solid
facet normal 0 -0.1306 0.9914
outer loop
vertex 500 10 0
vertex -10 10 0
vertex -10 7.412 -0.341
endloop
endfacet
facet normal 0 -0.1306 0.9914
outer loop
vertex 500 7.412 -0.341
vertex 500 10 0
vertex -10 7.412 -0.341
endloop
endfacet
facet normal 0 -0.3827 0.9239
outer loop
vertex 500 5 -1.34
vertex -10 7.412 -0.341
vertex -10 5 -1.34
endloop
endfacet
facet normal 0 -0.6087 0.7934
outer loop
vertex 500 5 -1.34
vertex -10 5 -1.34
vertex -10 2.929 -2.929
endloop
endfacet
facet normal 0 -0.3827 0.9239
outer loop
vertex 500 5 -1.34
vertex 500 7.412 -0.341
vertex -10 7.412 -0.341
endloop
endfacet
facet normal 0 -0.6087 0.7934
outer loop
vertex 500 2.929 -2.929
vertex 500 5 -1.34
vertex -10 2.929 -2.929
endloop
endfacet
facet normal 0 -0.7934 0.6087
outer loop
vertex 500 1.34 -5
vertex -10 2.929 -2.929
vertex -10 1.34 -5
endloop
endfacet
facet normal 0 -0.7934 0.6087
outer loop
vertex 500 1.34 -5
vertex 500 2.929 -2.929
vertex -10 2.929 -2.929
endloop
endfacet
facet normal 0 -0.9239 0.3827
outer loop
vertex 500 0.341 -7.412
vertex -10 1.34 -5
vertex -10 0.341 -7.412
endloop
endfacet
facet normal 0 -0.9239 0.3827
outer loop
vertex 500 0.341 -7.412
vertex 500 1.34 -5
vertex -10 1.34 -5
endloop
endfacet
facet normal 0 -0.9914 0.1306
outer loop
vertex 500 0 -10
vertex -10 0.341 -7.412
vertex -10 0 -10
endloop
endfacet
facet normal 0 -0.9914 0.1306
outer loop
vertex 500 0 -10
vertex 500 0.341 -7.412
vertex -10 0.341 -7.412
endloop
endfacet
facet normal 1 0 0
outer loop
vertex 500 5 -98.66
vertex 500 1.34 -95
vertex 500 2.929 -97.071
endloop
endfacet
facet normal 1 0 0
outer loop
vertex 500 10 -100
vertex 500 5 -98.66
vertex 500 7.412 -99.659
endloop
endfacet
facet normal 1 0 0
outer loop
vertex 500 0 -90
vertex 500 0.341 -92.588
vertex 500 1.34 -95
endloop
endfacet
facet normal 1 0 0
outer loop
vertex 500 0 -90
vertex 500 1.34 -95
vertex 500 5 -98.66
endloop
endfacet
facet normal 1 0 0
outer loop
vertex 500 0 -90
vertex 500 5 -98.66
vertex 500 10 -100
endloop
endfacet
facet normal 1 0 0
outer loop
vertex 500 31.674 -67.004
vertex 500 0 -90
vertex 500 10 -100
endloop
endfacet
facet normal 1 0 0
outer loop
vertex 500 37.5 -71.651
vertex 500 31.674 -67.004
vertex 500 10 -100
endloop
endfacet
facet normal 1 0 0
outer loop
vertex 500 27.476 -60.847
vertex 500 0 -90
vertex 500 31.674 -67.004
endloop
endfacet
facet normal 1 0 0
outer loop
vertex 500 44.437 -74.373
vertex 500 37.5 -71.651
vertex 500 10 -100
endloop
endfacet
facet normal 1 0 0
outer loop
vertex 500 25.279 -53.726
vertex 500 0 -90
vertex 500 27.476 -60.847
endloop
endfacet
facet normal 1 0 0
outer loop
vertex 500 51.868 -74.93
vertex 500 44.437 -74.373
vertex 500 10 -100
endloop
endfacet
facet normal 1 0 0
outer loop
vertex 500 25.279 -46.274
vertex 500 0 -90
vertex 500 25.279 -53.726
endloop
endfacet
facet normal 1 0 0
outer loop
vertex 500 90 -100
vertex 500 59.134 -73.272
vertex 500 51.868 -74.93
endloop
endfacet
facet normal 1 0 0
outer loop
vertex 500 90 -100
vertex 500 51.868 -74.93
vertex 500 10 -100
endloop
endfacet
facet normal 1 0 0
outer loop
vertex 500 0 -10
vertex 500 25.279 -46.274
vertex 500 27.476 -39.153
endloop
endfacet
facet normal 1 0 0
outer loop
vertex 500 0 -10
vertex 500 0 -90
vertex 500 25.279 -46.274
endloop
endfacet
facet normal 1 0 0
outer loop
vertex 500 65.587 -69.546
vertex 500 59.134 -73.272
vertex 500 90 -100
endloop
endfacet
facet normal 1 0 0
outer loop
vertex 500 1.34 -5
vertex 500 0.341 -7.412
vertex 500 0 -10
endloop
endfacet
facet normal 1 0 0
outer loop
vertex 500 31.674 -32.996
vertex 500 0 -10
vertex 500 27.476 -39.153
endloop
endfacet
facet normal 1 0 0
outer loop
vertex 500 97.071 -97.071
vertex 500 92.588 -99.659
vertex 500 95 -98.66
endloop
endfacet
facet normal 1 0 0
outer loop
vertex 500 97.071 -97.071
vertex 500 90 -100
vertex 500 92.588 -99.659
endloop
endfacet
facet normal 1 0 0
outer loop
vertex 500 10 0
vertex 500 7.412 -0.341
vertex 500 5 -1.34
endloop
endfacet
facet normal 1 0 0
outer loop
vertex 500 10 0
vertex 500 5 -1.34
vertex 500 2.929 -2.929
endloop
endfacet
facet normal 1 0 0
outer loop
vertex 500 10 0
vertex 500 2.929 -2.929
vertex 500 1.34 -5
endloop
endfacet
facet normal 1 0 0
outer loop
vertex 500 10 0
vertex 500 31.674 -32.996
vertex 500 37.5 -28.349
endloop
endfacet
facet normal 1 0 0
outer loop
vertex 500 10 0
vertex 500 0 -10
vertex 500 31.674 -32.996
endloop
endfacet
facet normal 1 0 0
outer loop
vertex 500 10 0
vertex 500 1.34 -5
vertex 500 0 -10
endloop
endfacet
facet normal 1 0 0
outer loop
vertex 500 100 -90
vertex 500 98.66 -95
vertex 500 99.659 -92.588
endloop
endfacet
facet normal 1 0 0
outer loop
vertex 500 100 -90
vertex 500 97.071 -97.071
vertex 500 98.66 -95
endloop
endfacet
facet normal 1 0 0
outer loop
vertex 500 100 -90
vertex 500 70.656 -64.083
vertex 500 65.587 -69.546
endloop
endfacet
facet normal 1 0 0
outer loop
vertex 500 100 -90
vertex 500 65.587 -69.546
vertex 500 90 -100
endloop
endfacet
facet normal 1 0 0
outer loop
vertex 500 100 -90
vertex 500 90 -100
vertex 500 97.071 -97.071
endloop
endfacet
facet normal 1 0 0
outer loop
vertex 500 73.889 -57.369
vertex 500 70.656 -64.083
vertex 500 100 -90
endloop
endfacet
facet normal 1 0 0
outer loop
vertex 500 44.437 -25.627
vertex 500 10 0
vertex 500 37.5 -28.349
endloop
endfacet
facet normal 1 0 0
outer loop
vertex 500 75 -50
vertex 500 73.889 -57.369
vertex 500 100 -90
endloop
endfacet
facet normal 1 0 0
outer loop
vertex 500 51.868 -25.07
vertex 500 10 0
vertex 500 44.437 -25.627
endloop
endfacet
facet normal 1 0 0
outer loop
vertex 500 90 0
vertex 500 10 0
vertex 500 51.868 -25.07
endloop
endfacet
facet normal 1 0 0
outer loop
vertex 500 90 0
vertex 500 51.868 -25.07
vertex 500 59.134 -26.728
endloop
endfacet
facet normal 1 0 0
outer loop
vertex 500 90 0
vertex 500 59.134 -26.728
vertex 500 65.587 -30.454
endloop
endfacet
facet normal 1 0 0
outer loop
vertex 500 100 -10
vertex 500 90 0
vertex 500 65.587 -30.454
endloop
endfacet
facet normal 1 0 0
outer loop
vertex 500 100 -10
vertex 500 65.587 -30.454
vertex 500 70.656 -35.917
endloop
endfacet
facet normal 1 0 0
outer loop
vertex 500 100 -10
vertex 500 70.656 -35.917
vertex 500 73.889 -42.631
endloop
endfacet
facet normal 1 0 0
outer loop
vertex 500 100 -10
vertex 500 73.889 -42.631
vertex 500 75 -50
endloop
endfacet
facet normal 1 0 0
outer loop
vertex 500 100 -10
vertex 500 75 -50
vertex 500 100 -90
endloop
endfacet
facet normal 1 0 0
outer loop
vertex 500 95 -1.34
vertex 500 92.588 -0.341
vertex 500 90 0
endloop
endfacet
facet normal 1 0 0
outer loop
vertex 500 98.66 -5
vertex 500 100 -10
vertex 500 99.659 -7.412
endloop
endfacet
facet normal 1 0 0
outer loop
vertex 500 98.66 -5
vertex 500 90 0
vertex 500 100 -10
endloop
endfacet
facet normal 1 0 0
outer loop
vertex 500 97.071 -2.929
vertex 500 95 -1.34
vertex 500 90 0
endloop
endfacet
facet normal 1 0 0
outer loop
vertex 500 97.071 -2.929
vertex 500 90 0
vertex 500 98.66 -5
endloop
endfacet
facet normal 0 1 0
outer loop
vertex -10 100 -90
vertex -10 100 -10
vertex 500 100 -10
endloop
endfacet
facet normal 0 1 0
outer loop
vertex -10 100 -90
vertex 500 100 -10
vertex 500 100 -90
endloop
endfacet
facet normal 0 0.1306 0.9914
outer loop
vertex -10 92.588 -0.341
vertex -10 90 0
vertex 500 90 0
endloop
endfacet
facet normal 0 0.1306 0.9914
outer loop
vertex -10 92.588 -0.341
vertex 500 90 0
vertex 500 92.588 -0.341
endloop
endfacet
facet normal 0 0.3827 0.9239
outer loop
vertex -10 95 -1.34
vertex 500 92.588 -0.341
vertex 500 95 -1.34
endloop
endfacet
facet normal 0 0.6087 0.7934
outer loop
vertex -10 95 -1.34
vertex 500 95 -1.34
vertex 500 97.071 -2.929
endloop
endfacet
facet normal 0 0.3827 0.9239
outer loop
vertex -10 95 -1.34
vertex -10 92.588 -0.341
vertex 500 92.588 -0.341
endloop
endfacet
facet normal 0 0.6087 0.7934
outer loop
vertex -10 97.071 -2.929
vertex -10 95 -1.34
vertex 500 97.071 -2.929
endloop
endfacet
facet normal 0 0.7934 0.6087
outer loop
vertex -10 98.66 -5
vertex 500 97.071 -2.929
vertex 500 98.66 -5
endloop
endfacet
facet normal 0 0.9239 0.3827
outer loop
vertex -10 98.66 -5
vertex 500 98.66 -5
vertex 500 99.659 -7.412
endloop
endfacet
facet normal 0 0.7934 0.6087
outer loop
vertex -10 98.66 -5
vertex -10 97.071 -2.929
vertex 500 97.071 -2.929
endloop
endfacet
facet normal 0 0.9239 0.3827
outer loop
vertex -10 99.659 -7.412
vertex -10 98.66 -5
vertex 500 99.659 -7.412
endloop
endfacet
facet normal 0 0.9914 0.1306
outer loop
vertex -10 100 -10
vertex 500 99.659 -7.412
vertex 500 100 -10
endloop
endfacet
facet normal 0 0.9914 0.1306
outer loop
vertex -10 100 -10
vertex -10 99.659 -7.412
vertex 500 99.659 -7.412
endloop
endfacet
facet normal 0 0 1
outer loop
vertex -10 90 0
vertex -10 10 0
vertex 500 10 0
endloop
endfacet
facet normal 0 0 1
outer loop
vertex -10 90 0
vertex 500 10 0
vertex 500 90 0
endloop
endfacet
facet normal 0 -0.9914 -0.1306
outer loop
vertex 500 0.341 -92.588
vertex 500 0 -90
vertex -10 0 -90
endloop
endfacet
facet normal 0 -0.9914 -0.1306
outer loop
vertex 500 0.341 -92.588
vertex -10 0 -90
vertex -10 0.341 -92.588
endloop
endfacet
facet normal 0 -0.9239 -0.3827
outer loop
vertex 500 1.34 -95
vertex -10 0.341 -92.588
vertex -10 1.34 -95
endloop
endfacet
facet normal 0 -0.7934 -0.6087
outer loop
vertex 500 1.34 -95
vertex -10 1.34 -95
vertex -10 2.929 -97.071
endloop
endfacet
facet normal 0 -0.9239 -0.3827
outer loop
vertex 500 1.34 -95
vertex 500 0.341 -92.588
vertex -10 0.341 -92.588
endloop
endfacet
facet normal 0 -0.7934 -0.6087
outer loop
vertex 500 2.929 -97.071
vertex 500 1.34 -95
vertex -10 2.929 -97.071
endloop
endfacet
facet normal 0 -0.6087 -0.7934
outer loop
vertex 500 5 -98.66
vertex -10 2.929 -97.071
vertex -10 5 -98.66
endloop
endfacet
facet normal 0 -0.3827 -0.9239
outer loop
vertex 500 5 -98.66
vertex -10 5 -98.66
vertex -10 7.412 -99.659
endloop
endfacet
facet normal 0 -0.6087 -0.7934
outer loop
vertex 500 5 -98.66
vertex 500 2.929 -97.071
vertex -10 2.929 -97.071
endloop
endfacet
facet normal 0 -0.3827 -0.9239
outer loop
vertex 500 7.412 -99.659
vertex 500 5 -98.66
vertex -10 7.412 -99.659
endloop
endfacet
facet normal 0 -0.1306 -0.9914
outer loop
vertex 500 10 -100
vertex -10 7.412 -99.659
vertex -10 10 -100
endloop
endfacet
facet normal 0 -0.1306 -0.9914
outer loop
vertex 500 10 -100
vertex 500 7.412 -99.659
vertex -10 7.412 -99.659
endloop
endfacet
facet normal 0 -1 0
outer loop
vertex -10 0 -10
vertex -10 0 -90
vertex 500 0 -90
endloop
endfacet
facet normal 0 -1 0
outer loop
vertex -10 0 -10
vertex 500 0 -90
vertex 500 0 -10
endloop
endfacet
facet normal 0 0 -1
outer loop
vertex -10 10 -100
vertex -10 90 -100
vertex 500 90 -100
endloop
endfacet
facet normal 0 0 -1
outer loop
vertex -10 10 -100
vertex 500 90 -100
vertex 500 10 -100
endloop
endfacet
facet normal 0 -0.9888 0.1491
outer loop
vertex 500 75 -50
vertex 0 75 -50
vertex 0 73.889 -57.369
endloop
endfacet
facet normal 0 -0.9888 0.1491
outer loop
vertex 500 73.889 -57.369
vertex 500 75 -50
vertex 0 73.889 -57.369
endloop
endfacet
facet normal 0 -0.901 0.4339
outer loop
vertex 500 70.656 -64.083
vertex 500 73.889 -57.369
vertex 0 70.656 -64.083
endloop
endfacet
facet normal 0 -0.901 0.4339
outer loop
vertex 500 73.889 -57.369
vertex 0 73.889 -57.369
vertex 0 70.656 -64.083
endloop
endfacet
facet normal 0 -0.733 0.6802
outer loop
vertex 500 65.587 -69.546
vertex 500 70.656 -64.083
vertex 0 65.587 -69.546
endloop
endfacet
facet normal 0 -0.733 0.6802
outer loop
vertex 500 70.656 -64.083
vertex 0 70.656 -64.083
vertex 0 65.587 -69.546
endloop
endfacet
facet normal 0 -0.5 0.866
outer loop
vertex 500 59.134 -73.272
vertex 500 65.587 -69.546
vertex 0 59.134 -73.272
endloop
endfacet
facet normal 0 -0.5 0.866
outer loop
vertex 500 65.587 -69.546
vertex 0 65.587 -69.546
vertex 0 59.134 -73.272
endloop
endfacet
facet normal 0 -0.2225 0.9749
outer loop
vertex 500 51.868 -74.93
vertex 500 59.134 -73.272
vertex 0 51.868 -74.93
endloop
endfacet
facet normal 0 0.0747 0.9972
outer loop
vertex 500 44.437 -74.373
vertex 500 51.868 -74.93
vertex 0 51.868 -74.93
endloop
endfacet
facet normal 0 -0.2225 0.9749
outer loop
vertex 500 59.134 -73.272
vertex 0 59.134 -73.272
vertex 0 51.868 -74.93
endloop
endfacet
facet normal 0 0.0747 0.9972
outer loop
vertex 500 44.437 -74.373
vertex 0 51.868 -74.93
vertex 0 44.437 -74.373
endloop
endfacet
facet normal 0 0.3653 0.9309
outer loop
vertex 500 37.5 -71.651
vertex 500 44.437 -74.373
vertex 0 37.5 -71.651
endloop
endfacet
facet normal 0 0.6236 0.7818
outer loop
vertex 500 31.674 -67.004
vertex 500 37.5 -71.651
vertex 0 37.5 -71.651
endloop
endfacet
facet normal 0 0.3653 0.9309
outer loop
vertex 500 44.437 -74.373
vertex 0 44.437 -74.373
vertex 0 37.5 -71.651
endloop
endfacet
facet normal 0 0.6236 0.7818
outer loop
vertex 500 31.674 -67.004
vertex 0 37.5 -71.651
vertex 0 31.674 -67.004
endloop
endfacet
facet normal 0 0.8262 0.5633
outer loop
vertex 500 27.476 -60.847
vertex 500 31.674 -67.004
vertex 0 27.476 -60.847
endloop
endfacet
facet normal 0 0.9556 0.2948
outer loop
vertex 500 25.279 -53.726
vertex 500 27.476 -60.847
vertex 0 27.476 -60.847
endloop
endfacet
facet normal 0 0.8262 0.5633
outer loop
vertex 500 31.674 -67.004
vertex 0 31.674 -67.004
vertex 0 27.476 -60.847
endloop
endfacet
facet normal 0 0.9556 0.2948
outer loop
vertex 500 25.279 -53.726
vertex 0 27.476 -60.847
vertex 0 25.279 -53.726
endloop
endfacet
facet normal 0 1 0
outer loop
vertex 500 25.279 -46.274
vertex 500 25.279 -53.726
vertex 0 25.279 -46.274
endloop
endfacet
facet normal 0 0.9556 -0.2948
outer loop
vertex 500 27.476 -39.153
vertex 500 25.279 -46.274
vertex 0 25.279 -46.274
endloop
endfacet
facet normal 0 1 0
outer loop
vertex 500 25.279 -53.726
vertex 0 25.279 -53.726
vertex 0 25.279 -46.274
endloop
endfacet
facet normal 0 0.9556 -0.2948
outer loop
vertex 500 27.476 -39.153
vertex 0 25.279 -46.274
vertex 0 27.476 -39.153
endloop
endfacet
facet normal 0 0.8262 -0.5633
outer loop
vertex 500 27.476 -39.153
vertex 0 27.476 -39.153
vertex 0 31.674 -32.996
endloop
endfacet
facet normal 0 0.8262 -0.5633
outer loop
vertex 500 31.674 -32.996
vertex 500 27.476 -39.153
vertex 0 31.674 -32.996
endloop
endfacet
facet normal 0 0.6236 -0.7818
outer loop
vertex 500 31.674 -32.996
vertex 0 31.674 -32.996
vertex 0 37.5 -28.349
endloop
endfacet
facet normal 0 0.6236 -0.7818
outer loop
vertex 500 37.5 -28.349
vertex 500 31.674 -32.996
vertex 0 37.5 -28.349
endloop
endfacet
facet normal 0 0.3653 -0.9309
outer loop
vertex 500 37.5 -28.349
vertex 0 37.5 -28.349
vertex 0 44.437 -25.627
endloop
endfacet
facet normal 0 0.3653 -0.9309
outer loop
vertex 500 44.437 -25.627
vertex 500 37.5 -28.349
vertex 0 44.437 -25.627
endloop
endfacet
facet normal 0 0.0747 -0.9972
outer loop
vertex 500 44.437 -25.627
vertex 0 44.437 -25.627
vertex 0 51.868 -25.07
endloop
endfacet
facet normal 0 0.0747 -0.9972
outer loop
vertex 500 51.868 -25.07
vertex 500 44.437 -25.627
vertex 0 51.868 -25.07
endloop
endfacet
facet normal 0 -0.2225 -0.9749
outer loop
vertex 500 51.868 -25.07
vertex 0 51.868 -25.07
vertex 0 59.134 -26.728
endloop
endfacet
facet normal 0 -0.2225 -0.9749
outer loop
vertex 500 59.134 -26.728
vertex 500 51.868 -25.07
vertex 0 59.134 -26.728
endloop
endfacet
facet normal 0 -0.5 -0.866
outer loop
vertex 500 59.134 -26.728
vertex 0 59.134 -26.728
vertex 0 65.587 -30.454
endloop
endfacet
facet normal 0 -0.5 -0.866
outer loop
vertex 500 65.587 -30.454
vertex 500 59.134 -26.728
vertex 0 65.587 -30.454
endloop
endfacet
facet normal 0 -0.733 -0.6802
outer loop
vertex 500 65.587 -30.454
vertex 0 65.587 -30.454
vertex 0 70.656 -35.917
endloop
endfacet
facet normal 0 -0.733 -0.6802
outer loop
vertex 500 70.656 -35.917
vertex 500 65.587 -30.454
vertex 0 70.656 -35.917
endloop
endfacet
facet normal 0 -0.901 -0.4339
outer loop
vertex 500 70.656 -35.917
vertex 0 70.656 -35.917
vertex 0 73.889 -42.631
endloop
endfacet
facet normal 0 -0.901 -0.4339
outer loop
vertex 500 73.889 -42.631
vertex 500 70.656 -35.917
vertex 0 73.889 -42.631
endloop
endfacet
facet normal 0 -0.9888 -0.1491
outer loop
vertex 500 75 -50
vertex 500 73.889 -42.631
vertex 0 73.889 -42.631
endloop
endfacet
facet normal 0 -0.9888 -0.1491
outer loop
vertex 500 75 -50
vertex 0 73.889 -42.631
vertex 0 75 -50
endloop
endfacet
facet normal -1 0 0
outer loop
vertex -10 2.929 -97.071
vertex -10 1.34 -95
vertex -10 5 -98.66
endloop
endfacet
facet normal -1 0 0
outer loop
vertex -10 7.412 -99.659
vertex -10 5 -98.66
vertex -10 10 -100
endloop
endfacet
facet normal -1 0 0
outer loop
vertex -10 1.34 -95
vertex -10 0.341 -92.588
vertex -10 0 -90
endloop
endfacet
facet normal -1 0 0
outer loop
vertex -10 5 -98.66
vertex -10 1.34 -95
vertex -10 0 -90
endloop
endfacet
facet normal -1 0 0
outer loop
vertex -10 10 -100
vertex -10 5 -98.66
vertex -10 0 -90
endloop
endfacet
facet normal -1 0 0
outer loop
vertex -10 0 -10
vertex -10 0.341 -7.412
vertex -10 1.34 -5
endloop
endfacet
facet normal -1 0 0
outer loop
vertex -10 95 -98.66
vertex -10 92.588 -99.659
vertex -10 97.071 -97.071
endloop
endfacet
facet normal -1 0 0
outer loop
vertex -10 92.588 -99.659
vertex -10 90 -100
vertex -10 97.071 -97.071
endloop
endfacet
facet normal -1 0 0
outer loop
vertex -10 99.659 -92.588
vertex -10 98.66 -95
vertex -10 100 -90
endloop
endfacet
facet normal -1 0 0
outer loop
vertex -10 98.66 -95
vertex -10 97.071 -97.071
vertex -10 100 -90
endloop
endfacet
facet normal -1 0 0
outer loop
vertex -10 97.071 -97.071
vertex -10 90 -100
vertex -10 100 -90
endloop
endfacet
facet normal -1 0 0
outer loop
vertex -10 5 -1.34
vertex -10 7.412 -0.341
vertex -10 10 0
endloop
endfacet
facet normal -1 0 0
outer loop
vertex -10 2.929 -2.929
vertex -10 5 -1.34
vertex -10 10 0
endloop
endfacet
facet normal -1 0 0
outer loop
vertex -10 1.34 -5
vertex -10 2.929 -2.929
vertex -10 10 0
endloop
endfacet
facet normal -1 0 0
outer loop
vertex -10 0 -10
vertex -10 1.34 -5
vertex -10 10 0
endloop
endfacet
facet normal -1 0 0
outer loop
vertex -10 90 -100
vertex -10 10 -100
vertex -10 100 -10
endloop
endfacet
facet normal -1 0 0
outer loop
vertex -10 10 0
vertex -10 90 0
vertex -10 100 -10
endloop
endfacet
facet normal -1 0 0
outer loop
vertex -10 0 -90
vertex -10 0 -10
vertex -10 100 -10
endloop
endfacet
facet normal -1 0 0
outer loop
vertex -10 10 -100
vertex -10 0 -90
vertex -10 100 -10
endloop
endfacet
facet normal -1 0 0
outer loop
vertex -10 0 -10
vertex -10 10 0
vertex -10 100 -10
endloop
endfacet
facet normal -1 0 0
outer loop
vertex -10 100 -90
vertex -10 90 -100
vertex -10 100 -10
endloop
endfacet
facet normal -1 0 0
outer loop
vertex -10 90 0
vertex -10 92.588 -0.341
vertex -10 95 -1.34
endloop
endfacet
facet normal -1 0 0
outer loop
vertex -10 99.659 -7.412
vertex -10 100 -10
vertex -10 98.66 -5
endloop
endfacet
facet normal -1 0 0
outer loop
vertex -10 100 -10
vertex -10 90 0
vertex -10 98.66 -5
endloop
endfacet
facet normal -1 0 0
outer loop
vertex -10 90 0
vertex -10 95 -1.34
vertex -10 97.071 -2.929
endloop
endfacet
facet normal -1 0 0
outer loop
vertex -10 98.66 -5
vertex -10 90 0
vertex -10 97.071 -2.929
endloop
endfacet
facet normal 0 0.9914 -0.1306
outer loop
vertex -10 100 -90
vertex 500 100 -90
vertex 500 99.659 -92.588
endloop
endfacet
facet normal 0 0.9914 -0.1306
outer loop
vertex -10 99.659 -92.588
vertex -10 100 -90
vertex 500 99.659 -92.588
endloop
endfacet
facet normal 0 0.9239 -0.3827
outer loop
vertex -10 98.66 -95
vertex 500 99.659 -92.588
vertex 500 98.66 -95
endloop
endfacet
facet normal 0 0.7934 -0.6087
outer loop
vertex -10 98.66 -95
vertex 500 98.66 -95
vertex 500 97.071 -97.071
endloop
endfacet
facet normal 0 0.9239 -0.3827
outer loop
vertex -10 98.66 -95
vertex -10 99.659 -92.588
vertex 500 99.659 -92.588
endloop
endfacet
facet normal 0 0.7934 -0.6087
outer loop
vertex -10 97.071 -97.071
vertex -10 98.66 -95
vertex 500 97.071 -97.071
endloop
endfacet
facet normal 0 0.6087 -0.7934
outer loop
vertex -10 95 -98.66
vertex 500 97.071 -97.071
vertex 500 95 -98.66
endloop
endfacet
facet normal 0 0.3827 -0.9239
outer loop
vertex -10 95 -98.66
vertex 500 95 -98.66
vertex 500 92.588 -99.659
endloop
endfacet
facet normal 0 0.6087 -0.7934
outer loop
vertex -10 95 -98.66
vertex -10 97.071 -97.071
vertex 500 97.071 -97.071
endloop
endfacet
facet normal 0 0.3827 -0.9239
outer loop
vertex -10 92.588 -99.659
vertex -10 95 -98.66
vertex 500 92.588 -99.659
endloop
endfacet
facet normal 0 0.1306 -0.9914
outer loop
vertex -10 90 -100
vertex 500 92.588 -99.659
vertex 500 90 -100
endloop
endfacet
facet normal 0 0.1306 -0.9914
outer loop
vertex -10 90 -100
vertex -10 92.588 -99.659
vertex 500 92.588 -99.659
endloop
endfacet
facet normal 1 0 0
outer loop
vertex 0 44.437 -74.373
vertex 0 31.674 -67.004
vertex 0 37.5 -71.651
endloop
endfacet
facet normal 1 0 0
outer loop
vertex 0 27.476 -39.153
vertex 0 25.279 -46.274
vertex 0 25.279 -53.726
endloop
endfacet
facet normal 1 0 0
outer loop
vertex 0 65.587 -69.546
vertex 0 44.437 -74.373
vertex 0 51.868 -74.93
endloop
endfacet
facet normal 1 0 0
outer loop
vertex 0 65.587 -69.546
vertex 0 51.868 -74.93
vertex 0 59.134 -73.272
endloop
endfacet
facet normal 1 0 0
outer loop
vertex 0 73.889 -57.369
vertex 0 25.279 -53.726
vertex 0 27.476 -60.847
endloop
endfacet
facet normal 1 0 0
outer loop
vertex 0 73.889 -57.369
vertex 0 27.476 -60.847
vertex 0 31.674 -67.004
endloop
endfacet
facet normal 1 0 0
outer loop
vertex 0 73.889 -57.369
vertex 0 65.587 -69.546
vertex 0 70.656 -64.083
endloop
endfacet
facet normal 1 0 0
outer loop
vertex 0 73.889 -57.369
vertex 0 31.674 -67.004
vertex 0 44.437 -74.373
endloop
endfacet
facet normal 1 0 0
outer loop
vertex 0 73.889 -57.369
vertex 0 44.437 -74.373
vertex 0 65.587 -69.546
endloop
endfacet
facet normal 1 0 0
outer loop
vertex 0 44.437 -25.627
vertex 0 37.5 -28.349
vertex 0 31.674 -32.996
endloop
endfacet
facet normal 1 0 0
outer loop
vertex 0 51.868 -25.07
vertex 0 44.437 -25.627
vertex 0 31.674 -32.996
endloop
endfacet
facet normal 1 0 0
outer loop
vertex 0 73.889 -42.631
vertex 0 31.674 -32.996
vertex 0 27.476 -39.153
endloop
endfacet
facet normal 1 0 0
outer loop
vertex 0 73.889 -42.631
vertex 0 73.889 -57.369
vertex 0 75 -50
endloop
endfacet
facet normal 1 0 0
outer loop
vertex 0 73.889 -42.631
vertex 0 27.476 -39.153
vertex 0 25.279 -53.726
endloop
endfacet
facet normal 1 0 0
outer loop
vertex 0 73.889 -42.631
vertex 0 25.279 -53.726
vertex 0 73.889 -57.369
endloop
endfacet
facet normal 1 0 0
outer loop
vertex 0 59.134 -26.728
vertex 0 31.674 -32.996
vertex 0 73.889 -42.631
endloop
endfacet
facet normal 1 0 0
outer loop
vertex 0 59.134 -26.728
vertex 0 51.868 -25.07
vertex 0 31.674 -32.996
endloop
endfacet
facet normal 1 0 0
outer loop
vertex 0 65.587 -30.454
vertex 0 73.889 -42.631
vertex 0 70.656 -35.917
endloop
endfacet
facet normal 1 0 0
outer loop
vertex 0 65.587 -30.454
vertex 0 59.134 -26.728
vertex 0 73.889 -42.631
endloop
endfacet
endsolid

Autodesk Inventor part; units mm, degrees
ref_plane "YZ Plane" through (0, 0, 0) normal (1, 0, 0) x (0, 1, 0)
ref_plane "XZ Plane" through (0, 0, 0) normal (0, 1, 0) x (-1, 0, 0)
ref_plane "XY Plane" through (0, 0, 0) normal (0, 0, 1) x (1, 0, 0)
sketch "Sketch1" plane through (0, 0, 0) normal (1, 0, 0) x (0, 1, 0)
  line L0 (0, 0) -> (100, 0)
  line L1 (100, 0) -> (100, -100)
  line L2 (100, -100) -> (0, -100)
  line L3 (0, -100) -> (0, 0)
  circle A0 centre (50, -50) radius 25
  line L4 (50, 0) -> (50, -50)
  line L5 (50, -50) -> (0, -50)
  dimension "d0" = 100
  dimension "d1" = 100
  dimension "d4" = 50
  dimension "d8" = 50
  dimension "d9" = 50
extrude "Extrusion1" add sketch "Sketch1" along normal blind 500 contours L0 L4 A0 L5 L3 | L0 L1 L2 L3 L5 A0 L4
extrude "Extrusion2" add sketch "Sketch1" against normal blind 10
fillet "Fillet1" radius 10 4 edges at (245, 100, 0) (245, 0, 0) (245, 0, -100) (245, 100, -100)
properties part number "Contenedor"
